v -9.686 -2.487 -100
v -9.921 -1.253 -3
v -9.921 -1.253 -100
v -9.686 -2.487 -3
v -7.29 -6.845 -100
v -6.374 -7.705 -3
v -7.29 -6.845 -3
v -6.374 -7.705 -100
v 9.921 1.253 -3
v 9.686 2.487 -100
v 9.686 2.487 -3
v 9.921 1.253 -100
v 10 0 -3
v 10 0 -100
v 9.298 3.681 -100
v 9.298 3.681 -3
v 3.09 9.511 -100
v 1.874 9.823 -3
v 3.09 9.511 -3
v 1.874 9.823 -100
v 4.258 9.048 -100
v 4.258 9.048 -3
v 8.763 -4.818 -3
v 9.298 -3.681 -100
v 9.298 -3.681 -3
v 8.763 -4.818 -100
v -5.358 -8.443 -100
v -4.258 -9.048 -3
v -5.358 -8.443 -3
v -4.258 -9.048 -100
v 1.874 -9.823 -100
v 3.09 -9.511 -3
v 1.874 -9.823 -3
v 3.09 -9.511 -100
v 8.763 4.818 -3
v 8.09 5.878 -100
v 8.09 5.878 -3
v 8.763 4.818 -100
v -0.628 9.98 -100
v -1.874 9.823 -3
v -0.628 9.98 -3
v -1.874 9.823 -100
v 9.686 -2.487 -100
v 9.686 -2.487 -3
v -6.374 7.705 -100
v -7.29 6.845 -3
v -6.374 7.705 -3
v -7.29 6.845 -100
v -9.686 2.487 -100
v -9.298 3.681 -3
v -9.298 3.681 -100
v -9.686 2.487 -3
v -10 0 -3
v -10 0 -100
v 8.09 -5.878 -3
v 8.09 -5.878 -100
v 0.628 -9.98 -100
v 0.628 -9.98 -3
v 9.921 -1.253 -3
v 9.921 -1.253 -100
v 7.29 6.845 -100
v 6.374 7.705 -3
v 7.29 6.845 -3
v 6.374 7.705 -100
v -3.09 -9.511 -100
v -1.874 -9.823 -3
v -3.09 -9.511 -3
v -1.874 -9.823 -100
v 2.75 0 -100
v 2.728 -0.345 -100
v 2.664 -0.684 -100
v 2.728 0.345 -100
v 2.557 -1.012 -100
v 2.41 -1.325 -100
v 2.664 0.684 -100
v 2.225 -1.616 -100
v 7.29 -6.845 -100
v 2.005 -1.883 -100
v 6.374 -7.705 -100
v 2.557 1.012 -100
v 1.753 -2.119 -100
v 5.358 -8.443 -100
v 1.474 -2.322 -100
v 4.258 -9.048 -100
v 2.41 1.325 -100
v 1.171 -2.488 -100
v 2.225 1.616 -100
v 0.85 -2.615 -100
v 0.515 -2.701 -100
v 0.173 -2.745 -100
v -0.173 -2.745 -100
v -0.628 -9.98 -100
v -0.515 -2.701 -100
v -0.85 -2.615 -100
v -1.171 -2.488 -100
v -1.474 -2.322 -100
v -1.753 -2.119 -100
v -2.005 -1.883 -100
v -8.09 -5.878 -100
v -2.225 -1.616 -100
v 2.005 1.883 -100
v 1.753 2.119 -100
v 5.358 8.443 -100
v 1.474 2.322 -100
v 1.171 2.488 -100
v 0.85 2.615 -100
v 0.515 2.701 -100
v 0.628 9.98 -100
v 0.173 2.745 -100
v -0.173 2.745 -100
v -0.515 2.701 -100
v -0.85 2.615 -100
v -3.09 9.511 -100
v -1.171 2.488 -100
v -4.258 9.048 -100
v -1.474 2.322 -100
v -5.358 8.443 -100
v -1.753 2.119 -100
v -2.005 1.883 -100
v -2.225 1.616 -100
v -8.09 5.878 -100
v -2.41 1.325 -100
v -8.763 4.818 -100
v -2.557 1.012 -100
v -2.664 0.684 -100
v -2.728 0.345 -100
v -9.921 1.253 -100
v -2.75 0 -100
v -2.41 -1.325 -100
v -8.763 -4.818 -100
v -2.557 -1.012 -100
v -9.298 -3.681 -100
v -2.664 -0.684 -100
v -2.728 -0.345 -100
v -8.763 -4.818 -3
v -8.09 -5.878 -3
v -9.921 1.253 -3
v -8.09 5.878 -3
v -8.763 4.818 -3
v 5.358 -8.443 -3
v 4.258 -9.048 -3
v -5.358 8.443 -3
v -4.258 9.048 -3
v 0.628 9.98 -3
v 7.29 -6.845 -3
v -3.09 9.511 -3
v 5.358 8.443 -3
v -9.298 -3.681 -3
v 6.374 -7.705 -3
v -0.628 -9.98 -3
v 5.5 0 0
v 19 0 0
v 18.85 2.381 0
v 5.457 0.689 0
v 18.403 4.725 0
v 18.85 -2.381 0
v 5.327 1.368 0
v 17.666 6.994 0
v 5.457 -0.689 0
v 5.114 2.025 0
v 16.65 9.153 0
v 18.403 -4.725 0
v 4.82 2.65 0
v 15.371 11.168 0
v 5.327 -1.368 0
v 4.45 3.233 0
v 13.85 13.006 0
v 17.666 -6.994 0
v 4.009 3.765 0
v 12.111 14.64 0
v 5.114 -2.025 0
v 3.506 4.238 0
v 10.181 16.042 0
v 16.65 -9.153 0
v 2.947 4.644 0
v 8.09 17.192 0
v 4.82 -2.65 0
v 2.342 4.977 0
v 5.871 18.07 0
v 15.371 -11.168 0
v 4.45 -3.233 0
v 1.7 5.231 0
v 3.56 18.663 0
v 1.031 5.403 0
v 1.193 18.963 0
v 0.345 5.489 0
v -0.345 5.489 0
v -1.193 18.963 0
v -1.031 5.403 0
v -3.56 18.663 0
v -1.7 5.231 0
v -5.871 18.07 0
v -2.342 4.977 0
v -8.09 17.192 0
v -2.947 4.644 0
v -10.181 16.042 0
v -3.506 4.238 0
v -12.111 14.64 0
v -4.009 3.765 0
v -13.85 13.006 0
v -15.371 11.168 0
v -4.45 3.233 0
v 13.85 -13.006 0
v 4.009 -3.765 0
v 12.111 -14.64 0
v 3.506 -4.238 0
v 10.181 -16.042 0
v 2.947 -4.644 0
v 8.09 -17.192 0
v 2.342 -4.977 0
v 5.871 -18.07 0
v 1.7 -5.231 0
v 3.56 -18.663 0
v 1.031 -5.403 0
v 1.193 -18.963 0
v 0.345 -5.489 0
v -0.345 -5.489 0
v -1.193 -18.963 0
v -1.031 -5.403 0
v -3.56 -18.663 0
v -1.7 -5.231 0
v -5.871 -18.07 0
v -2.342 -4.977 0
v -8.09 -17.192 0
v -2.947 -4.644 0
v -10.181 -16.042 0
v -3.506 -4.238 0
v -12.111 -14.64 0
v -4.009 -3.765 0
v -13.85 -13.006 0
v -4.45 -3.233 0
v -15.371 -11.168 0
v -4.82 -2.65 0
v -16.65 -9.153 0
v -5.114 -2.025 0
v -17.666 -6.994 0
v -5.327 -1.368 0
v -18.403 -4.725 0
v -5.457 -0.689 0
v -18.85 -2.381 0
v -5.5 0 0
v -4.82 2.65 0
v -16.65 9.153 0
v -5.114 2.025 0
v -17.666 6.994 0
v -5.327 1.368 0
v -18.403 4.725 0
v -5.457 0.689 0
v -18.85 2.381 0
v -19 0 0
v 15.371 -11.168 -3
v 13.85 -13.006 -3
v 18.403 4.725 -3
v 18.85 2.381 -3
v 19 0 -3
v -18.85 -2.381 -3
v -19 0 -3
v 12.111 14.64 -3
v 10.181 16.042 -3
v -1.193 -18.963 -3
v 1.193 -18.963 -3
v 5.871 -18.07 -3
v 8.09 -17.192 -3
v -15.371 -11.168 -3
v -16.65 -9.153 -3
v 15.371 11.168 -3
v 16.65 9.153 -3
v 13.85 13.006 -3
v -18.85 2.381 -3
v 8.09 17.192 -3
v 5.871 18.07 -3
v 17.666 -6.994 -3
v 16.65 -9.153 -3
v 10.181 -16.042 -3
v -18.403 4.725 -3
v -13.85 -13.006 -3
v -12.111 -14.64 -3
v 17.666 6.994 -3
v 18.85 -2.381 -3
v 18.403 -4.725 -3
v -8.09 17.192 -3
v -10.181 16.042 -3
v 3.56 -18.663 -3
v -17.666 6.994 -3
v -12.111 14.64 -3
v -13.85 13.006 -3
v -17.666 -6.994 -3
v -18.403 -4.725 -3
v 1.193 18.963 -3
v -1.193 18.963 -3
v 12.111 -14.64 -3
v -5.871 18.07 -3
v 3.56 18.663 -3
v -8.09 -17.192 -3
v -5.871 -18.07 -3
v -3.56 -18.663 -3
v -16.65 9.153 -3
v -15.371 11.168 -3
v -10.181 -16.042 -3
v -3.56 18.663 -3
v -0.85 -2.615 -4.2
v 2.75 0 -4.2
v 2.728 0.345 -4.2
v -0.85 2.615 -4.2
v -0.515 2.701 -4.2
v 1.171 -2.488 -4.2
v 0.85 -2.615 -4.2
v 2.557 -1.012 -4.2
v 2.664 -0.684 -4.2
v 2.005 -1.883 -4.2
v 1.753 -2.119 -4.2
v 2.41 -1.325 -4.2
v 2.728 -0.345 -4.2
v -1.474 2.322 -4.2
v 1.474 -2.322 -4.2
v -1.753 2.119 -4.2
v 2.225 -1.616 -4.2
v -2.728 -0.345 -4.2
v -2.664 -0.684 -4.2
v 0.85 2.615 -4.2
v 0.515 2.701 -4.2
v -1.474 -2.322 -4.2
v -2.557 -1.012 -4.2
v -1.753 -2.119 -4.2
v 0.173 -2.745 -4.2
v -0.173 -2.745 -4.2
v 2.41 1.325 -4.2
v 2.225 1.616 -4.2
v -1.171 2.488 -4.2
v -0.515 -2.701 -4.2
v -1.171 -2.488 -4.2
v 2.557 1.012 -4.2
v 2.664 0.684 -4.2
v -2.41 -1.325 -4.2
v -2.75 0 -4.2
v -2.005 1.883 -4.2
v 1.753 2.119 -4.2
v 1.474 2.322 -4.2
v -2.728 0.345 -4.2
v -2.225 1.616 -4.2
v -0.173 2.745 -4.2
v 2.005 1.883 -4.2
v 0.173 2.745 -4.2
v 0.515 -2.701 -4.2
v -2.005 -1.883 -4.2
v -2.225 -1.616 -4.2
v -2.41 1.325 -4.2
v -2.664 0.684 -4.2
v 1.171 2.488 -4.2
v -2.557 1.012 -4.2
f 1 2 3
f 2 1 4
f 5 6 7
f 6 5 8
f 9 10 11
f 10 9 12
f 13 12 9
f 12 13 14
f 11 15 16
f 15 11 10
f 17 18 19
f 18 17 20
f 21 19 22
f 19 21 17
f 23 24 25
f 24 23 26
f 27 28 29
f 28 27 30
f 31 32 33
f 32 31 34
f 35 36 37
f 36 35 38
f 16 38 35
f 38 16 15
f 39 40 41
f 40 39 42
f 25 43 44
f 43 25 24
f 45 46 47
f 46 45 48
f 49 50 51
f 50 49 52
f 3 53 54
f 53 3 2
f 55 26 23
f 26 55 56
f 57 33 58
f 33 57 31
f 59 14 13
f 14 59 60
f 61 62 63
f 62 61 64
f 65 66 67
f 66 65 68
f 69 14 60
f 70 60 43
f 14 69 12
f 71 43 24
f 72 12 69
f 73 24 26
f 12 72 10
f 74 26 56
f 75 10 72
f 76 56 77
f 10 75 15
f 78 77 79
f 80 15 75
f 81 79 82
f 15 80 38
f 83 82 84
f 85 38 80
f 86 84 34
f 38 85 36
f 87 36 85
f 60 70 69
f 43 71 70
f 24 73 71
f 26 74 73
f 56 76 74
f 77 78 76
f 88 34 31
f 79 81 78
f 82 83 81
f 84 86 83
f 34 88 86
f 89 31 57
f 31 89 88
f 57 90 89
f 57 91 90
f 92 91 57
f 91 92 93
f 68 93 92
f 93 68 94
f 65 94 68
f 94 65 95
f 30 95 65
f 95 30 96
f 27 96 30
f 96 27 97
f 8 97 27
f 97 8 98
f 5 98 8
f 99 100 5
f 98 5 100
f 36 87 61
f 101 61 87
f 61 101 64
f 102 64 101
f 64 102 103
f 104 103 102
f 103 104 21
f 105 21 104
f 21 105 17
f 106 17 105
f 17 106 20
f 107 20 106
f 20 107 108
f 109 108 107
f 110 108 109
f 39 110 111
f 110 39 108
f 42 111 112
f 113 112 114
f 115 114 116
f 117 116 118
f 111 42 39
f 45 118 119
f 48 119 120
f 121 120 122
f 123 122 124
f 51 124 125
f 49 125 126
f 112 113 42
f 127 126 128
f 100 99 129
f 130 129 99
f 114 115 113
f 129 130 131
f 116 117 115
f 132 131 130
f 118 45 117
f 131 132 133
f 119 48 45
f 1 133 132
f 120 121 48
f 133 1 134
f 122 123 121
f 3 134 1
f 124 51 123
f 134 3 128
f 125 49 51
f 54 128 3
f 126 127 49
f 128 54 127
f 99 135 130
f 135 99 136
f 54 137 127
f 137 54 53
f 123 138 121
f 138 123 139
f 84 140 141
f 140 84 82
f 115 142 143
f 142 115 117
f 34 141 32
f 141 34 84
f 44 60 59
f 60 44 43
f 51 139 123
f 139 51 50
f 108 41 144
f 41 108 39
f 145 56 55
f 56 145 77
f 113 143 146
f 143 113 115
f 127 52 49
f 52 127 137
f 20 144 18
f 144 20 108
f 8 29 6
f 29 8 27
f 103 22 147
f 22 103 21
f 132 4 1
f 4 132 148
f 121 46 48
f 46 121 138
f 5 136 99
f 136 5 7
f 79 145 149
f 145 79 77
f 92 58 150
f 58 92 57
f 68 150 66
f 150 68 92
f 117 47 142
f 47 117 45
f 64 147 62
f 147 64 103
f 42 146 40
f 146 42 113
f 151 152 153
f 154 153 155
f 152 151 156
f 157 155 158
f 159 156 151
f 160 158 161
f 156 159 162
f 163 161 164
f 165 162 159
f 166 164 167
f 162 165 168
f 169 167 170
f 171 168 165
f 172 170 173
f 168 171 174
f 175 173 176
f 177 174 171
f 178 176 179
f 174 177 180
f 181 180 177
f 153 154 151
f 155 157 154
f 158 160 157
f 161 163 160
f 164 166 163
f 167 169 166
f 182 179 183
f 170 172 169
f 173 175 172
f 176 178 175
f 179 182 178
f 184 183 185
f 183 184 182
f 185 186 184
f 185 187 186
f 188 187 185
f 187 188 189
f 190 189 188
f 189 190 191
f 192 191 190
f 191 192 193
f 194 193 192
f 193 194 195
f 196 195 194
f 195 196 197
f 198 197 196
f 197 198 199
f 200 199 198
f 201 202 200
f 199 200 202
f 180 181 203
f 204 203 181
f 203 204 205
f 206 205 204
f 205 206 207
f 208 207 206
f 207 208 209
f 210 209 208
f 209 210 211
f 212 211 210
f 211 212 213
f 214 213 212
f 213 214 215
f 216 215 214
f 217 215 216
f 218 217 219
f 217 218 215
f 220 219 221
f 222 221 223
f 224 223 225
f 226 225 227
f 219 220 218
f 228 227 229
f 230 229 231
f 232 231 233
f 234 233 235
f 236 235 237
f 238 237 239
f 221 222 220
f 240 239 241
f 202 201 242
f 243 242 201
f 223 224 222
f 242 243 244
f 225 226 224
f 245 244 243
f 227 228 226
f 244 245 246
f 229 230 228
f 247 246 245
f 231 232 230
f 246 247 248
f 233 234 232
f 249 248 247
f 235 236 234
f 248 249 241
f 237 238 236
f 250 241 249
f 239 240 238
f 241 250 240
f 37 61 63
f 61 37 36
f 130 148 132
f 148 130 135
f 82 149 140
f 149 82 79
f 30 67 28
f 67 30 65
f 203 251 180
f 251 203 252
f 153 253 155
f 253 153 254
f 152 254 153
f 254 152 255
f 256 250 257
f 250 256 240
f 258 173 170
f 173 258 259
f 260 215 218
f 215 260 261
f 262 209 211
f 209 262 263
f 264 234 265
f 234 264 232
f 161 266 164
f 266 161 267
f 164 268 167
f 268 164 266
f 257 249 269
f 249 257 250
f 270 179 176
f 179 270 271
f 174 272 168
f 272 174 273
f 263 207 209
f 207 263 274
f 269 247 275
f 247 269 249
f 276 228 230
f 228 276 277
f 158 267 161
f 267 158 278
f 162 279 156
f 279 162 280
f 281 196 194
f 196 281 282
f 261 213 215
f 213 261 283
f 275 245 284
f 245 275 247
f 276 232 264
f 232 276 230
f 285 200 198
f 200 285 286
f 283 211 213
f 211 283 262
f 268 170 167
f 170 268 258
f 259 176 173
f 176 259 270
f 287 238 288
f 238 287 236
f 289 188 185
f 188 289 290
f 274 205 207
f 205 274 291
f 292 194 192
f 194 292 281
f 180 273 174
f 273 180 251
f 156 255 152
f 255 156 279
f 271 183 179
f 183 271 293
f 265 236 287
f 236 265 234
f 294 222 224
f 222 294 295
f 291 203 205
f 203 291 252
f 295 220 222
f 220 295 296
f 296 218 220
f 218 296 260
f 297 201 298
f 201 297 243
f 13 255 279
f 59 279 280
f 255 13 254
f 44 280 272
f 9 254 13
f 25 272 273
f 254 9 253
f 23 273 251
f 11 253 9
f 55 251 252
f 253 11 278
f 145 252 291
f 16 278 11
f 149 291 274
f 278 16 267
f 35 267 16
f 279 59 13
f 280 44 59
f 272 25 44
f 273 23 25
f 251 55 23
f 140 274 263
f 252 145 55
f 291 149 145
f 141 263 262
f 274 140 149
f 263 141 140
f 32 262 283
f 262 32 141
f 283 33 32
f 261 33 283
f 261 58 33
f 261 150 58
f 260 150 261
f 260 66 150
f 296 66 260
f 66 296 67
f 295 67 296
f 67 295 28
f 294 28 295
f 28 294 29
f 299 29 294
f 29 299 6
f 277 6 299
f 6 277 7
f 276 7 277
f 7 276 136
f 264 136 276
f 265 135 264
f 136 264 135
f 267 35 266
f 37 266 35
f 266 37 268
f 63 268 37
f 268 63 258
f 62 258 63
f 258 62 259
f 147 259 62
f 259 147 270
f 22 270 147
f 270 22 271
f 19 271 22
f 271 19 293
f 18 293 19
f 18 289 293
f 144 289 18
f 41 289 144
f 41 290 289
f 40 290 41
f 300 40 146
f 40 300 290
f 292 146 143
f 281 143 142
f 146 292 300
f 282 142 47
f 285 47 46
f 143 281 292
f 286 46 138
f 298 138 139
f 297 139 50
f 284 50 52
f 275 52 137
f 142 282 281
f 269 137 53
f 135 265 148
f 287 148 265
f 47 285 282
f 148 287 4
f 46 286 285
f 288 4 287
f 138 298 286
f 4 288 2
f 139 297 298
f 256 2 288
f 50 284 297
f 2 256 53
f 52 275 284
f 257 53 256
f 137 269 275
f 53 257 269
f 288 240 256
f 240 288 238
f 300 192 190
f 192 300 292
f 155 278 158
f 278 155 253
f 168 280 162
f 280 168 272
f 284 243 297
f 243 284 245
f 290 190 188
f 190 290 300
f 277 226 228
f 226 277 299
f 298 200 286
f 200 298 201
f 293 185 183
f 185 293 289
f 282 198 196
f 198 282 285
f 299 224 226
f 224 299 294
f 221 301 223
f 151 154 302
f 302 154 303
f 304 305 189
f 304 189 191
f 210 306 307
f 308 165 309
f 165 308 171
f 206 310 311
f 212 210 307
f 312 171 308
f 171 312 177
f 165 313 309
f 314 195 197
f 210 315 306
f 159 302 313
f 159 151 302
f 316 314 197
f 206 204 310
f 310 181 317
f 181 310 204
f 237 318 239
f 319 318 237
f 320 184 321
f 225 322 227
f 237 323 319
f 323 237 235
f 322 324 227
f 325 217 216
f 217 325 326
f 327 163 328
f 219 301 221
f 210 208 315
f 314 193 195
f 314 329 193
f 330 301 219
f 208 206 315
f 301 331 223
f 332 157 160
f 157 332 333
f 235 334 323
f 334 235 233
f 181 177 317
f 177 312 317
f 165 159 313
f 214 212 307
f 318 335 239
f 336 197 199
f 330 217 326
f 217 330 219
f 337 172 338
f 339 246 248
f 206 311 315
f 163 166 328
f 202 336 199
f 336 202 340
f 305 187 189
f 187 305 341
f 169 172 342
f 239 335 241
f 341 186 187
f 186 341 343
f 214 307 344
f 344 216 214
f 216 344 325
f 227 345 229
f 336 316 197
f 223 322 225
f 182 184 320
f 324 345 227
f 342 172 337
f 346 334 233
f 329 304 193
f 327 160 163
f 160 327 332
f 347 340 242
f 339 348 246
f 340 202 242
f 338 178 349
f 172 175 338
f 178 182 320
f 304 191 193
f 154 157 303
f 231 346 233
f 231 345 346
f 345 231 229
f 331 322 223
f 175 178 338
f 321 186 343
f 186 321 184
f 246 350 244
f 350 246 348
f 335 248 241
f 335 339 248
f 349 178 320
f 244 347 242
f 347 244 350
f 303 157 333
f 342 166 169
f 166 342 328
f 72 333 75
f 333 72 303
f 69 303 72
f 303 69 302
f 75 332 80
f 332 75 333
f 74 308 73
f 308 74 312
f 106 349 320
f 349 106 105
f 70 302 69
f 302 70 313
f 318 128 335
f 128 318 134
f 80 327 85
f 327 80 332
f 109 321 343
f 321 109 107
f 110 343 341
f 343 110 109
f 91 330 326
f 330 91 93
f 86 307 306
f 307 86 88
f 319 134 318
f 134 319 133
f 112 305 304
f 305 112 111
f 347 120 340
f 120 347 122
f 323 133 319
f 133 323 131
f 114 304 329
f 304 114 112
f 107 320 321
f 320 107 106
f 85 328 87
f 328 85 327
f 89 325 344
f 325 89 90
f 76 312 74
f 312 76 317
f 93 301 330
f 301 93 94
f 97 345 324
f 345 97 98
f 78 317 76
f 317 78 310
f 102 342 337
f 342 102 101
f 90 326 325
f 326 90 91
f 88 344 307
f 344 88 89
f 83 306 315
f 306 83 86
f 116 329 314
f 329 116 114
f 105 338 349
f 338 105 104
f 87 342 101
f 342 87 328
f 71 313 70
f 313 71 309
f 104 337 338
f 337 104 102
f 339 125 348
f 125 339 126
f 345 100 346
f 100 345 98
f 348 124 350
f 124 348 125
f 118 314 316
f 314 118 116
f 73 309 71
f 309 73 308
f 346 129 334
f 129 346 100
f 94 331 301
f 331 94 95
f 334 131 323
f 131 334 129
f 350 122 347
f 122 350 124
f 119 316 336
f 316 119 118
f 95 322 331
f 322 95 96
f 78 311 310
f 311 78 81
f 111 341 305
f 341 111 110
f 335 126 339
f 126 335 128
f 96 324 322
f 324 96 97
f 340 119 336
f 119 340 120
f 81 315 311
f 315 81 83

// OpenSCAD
$fn = 50;


difference() {
	union() {
		translate(v = [0, 0, -100.0000000000]) {
			cylinder(h = 100, r = 10.0000000000);
		}
		translate(v = [0, 0, -3.0000000000]) {
			cylinder(h = 3, r = 19.0000000000);
		}
	}
	union() {
		translate(v = [0, 0, 0]) {
			rotate(a = [0, 0, 0]) {
				difference() {
					union() {
						#translate(v = [0, 0, -100.0000000000]) {
							cylinder(h = 100, r = 2.2500000000);
						}
						#translate(v = [0, 0, -4.2000000000]) {
							cylinder(h = 4.2000000000, r = 10.0000000000, r1 = 2.7500000000, r2 = 5.5000000000);
						}
						#translate(v = [0, 0, -100.0000000000]) {
							cylinder(h = 100, r = 2.7500000000);
						}
						#translate(v = [0, 0, -100.0000000000]) {
							cylinder(h = 100, r = 2.2500000000);
						}
					}
					union();
				}
			}
		}
	}
}
